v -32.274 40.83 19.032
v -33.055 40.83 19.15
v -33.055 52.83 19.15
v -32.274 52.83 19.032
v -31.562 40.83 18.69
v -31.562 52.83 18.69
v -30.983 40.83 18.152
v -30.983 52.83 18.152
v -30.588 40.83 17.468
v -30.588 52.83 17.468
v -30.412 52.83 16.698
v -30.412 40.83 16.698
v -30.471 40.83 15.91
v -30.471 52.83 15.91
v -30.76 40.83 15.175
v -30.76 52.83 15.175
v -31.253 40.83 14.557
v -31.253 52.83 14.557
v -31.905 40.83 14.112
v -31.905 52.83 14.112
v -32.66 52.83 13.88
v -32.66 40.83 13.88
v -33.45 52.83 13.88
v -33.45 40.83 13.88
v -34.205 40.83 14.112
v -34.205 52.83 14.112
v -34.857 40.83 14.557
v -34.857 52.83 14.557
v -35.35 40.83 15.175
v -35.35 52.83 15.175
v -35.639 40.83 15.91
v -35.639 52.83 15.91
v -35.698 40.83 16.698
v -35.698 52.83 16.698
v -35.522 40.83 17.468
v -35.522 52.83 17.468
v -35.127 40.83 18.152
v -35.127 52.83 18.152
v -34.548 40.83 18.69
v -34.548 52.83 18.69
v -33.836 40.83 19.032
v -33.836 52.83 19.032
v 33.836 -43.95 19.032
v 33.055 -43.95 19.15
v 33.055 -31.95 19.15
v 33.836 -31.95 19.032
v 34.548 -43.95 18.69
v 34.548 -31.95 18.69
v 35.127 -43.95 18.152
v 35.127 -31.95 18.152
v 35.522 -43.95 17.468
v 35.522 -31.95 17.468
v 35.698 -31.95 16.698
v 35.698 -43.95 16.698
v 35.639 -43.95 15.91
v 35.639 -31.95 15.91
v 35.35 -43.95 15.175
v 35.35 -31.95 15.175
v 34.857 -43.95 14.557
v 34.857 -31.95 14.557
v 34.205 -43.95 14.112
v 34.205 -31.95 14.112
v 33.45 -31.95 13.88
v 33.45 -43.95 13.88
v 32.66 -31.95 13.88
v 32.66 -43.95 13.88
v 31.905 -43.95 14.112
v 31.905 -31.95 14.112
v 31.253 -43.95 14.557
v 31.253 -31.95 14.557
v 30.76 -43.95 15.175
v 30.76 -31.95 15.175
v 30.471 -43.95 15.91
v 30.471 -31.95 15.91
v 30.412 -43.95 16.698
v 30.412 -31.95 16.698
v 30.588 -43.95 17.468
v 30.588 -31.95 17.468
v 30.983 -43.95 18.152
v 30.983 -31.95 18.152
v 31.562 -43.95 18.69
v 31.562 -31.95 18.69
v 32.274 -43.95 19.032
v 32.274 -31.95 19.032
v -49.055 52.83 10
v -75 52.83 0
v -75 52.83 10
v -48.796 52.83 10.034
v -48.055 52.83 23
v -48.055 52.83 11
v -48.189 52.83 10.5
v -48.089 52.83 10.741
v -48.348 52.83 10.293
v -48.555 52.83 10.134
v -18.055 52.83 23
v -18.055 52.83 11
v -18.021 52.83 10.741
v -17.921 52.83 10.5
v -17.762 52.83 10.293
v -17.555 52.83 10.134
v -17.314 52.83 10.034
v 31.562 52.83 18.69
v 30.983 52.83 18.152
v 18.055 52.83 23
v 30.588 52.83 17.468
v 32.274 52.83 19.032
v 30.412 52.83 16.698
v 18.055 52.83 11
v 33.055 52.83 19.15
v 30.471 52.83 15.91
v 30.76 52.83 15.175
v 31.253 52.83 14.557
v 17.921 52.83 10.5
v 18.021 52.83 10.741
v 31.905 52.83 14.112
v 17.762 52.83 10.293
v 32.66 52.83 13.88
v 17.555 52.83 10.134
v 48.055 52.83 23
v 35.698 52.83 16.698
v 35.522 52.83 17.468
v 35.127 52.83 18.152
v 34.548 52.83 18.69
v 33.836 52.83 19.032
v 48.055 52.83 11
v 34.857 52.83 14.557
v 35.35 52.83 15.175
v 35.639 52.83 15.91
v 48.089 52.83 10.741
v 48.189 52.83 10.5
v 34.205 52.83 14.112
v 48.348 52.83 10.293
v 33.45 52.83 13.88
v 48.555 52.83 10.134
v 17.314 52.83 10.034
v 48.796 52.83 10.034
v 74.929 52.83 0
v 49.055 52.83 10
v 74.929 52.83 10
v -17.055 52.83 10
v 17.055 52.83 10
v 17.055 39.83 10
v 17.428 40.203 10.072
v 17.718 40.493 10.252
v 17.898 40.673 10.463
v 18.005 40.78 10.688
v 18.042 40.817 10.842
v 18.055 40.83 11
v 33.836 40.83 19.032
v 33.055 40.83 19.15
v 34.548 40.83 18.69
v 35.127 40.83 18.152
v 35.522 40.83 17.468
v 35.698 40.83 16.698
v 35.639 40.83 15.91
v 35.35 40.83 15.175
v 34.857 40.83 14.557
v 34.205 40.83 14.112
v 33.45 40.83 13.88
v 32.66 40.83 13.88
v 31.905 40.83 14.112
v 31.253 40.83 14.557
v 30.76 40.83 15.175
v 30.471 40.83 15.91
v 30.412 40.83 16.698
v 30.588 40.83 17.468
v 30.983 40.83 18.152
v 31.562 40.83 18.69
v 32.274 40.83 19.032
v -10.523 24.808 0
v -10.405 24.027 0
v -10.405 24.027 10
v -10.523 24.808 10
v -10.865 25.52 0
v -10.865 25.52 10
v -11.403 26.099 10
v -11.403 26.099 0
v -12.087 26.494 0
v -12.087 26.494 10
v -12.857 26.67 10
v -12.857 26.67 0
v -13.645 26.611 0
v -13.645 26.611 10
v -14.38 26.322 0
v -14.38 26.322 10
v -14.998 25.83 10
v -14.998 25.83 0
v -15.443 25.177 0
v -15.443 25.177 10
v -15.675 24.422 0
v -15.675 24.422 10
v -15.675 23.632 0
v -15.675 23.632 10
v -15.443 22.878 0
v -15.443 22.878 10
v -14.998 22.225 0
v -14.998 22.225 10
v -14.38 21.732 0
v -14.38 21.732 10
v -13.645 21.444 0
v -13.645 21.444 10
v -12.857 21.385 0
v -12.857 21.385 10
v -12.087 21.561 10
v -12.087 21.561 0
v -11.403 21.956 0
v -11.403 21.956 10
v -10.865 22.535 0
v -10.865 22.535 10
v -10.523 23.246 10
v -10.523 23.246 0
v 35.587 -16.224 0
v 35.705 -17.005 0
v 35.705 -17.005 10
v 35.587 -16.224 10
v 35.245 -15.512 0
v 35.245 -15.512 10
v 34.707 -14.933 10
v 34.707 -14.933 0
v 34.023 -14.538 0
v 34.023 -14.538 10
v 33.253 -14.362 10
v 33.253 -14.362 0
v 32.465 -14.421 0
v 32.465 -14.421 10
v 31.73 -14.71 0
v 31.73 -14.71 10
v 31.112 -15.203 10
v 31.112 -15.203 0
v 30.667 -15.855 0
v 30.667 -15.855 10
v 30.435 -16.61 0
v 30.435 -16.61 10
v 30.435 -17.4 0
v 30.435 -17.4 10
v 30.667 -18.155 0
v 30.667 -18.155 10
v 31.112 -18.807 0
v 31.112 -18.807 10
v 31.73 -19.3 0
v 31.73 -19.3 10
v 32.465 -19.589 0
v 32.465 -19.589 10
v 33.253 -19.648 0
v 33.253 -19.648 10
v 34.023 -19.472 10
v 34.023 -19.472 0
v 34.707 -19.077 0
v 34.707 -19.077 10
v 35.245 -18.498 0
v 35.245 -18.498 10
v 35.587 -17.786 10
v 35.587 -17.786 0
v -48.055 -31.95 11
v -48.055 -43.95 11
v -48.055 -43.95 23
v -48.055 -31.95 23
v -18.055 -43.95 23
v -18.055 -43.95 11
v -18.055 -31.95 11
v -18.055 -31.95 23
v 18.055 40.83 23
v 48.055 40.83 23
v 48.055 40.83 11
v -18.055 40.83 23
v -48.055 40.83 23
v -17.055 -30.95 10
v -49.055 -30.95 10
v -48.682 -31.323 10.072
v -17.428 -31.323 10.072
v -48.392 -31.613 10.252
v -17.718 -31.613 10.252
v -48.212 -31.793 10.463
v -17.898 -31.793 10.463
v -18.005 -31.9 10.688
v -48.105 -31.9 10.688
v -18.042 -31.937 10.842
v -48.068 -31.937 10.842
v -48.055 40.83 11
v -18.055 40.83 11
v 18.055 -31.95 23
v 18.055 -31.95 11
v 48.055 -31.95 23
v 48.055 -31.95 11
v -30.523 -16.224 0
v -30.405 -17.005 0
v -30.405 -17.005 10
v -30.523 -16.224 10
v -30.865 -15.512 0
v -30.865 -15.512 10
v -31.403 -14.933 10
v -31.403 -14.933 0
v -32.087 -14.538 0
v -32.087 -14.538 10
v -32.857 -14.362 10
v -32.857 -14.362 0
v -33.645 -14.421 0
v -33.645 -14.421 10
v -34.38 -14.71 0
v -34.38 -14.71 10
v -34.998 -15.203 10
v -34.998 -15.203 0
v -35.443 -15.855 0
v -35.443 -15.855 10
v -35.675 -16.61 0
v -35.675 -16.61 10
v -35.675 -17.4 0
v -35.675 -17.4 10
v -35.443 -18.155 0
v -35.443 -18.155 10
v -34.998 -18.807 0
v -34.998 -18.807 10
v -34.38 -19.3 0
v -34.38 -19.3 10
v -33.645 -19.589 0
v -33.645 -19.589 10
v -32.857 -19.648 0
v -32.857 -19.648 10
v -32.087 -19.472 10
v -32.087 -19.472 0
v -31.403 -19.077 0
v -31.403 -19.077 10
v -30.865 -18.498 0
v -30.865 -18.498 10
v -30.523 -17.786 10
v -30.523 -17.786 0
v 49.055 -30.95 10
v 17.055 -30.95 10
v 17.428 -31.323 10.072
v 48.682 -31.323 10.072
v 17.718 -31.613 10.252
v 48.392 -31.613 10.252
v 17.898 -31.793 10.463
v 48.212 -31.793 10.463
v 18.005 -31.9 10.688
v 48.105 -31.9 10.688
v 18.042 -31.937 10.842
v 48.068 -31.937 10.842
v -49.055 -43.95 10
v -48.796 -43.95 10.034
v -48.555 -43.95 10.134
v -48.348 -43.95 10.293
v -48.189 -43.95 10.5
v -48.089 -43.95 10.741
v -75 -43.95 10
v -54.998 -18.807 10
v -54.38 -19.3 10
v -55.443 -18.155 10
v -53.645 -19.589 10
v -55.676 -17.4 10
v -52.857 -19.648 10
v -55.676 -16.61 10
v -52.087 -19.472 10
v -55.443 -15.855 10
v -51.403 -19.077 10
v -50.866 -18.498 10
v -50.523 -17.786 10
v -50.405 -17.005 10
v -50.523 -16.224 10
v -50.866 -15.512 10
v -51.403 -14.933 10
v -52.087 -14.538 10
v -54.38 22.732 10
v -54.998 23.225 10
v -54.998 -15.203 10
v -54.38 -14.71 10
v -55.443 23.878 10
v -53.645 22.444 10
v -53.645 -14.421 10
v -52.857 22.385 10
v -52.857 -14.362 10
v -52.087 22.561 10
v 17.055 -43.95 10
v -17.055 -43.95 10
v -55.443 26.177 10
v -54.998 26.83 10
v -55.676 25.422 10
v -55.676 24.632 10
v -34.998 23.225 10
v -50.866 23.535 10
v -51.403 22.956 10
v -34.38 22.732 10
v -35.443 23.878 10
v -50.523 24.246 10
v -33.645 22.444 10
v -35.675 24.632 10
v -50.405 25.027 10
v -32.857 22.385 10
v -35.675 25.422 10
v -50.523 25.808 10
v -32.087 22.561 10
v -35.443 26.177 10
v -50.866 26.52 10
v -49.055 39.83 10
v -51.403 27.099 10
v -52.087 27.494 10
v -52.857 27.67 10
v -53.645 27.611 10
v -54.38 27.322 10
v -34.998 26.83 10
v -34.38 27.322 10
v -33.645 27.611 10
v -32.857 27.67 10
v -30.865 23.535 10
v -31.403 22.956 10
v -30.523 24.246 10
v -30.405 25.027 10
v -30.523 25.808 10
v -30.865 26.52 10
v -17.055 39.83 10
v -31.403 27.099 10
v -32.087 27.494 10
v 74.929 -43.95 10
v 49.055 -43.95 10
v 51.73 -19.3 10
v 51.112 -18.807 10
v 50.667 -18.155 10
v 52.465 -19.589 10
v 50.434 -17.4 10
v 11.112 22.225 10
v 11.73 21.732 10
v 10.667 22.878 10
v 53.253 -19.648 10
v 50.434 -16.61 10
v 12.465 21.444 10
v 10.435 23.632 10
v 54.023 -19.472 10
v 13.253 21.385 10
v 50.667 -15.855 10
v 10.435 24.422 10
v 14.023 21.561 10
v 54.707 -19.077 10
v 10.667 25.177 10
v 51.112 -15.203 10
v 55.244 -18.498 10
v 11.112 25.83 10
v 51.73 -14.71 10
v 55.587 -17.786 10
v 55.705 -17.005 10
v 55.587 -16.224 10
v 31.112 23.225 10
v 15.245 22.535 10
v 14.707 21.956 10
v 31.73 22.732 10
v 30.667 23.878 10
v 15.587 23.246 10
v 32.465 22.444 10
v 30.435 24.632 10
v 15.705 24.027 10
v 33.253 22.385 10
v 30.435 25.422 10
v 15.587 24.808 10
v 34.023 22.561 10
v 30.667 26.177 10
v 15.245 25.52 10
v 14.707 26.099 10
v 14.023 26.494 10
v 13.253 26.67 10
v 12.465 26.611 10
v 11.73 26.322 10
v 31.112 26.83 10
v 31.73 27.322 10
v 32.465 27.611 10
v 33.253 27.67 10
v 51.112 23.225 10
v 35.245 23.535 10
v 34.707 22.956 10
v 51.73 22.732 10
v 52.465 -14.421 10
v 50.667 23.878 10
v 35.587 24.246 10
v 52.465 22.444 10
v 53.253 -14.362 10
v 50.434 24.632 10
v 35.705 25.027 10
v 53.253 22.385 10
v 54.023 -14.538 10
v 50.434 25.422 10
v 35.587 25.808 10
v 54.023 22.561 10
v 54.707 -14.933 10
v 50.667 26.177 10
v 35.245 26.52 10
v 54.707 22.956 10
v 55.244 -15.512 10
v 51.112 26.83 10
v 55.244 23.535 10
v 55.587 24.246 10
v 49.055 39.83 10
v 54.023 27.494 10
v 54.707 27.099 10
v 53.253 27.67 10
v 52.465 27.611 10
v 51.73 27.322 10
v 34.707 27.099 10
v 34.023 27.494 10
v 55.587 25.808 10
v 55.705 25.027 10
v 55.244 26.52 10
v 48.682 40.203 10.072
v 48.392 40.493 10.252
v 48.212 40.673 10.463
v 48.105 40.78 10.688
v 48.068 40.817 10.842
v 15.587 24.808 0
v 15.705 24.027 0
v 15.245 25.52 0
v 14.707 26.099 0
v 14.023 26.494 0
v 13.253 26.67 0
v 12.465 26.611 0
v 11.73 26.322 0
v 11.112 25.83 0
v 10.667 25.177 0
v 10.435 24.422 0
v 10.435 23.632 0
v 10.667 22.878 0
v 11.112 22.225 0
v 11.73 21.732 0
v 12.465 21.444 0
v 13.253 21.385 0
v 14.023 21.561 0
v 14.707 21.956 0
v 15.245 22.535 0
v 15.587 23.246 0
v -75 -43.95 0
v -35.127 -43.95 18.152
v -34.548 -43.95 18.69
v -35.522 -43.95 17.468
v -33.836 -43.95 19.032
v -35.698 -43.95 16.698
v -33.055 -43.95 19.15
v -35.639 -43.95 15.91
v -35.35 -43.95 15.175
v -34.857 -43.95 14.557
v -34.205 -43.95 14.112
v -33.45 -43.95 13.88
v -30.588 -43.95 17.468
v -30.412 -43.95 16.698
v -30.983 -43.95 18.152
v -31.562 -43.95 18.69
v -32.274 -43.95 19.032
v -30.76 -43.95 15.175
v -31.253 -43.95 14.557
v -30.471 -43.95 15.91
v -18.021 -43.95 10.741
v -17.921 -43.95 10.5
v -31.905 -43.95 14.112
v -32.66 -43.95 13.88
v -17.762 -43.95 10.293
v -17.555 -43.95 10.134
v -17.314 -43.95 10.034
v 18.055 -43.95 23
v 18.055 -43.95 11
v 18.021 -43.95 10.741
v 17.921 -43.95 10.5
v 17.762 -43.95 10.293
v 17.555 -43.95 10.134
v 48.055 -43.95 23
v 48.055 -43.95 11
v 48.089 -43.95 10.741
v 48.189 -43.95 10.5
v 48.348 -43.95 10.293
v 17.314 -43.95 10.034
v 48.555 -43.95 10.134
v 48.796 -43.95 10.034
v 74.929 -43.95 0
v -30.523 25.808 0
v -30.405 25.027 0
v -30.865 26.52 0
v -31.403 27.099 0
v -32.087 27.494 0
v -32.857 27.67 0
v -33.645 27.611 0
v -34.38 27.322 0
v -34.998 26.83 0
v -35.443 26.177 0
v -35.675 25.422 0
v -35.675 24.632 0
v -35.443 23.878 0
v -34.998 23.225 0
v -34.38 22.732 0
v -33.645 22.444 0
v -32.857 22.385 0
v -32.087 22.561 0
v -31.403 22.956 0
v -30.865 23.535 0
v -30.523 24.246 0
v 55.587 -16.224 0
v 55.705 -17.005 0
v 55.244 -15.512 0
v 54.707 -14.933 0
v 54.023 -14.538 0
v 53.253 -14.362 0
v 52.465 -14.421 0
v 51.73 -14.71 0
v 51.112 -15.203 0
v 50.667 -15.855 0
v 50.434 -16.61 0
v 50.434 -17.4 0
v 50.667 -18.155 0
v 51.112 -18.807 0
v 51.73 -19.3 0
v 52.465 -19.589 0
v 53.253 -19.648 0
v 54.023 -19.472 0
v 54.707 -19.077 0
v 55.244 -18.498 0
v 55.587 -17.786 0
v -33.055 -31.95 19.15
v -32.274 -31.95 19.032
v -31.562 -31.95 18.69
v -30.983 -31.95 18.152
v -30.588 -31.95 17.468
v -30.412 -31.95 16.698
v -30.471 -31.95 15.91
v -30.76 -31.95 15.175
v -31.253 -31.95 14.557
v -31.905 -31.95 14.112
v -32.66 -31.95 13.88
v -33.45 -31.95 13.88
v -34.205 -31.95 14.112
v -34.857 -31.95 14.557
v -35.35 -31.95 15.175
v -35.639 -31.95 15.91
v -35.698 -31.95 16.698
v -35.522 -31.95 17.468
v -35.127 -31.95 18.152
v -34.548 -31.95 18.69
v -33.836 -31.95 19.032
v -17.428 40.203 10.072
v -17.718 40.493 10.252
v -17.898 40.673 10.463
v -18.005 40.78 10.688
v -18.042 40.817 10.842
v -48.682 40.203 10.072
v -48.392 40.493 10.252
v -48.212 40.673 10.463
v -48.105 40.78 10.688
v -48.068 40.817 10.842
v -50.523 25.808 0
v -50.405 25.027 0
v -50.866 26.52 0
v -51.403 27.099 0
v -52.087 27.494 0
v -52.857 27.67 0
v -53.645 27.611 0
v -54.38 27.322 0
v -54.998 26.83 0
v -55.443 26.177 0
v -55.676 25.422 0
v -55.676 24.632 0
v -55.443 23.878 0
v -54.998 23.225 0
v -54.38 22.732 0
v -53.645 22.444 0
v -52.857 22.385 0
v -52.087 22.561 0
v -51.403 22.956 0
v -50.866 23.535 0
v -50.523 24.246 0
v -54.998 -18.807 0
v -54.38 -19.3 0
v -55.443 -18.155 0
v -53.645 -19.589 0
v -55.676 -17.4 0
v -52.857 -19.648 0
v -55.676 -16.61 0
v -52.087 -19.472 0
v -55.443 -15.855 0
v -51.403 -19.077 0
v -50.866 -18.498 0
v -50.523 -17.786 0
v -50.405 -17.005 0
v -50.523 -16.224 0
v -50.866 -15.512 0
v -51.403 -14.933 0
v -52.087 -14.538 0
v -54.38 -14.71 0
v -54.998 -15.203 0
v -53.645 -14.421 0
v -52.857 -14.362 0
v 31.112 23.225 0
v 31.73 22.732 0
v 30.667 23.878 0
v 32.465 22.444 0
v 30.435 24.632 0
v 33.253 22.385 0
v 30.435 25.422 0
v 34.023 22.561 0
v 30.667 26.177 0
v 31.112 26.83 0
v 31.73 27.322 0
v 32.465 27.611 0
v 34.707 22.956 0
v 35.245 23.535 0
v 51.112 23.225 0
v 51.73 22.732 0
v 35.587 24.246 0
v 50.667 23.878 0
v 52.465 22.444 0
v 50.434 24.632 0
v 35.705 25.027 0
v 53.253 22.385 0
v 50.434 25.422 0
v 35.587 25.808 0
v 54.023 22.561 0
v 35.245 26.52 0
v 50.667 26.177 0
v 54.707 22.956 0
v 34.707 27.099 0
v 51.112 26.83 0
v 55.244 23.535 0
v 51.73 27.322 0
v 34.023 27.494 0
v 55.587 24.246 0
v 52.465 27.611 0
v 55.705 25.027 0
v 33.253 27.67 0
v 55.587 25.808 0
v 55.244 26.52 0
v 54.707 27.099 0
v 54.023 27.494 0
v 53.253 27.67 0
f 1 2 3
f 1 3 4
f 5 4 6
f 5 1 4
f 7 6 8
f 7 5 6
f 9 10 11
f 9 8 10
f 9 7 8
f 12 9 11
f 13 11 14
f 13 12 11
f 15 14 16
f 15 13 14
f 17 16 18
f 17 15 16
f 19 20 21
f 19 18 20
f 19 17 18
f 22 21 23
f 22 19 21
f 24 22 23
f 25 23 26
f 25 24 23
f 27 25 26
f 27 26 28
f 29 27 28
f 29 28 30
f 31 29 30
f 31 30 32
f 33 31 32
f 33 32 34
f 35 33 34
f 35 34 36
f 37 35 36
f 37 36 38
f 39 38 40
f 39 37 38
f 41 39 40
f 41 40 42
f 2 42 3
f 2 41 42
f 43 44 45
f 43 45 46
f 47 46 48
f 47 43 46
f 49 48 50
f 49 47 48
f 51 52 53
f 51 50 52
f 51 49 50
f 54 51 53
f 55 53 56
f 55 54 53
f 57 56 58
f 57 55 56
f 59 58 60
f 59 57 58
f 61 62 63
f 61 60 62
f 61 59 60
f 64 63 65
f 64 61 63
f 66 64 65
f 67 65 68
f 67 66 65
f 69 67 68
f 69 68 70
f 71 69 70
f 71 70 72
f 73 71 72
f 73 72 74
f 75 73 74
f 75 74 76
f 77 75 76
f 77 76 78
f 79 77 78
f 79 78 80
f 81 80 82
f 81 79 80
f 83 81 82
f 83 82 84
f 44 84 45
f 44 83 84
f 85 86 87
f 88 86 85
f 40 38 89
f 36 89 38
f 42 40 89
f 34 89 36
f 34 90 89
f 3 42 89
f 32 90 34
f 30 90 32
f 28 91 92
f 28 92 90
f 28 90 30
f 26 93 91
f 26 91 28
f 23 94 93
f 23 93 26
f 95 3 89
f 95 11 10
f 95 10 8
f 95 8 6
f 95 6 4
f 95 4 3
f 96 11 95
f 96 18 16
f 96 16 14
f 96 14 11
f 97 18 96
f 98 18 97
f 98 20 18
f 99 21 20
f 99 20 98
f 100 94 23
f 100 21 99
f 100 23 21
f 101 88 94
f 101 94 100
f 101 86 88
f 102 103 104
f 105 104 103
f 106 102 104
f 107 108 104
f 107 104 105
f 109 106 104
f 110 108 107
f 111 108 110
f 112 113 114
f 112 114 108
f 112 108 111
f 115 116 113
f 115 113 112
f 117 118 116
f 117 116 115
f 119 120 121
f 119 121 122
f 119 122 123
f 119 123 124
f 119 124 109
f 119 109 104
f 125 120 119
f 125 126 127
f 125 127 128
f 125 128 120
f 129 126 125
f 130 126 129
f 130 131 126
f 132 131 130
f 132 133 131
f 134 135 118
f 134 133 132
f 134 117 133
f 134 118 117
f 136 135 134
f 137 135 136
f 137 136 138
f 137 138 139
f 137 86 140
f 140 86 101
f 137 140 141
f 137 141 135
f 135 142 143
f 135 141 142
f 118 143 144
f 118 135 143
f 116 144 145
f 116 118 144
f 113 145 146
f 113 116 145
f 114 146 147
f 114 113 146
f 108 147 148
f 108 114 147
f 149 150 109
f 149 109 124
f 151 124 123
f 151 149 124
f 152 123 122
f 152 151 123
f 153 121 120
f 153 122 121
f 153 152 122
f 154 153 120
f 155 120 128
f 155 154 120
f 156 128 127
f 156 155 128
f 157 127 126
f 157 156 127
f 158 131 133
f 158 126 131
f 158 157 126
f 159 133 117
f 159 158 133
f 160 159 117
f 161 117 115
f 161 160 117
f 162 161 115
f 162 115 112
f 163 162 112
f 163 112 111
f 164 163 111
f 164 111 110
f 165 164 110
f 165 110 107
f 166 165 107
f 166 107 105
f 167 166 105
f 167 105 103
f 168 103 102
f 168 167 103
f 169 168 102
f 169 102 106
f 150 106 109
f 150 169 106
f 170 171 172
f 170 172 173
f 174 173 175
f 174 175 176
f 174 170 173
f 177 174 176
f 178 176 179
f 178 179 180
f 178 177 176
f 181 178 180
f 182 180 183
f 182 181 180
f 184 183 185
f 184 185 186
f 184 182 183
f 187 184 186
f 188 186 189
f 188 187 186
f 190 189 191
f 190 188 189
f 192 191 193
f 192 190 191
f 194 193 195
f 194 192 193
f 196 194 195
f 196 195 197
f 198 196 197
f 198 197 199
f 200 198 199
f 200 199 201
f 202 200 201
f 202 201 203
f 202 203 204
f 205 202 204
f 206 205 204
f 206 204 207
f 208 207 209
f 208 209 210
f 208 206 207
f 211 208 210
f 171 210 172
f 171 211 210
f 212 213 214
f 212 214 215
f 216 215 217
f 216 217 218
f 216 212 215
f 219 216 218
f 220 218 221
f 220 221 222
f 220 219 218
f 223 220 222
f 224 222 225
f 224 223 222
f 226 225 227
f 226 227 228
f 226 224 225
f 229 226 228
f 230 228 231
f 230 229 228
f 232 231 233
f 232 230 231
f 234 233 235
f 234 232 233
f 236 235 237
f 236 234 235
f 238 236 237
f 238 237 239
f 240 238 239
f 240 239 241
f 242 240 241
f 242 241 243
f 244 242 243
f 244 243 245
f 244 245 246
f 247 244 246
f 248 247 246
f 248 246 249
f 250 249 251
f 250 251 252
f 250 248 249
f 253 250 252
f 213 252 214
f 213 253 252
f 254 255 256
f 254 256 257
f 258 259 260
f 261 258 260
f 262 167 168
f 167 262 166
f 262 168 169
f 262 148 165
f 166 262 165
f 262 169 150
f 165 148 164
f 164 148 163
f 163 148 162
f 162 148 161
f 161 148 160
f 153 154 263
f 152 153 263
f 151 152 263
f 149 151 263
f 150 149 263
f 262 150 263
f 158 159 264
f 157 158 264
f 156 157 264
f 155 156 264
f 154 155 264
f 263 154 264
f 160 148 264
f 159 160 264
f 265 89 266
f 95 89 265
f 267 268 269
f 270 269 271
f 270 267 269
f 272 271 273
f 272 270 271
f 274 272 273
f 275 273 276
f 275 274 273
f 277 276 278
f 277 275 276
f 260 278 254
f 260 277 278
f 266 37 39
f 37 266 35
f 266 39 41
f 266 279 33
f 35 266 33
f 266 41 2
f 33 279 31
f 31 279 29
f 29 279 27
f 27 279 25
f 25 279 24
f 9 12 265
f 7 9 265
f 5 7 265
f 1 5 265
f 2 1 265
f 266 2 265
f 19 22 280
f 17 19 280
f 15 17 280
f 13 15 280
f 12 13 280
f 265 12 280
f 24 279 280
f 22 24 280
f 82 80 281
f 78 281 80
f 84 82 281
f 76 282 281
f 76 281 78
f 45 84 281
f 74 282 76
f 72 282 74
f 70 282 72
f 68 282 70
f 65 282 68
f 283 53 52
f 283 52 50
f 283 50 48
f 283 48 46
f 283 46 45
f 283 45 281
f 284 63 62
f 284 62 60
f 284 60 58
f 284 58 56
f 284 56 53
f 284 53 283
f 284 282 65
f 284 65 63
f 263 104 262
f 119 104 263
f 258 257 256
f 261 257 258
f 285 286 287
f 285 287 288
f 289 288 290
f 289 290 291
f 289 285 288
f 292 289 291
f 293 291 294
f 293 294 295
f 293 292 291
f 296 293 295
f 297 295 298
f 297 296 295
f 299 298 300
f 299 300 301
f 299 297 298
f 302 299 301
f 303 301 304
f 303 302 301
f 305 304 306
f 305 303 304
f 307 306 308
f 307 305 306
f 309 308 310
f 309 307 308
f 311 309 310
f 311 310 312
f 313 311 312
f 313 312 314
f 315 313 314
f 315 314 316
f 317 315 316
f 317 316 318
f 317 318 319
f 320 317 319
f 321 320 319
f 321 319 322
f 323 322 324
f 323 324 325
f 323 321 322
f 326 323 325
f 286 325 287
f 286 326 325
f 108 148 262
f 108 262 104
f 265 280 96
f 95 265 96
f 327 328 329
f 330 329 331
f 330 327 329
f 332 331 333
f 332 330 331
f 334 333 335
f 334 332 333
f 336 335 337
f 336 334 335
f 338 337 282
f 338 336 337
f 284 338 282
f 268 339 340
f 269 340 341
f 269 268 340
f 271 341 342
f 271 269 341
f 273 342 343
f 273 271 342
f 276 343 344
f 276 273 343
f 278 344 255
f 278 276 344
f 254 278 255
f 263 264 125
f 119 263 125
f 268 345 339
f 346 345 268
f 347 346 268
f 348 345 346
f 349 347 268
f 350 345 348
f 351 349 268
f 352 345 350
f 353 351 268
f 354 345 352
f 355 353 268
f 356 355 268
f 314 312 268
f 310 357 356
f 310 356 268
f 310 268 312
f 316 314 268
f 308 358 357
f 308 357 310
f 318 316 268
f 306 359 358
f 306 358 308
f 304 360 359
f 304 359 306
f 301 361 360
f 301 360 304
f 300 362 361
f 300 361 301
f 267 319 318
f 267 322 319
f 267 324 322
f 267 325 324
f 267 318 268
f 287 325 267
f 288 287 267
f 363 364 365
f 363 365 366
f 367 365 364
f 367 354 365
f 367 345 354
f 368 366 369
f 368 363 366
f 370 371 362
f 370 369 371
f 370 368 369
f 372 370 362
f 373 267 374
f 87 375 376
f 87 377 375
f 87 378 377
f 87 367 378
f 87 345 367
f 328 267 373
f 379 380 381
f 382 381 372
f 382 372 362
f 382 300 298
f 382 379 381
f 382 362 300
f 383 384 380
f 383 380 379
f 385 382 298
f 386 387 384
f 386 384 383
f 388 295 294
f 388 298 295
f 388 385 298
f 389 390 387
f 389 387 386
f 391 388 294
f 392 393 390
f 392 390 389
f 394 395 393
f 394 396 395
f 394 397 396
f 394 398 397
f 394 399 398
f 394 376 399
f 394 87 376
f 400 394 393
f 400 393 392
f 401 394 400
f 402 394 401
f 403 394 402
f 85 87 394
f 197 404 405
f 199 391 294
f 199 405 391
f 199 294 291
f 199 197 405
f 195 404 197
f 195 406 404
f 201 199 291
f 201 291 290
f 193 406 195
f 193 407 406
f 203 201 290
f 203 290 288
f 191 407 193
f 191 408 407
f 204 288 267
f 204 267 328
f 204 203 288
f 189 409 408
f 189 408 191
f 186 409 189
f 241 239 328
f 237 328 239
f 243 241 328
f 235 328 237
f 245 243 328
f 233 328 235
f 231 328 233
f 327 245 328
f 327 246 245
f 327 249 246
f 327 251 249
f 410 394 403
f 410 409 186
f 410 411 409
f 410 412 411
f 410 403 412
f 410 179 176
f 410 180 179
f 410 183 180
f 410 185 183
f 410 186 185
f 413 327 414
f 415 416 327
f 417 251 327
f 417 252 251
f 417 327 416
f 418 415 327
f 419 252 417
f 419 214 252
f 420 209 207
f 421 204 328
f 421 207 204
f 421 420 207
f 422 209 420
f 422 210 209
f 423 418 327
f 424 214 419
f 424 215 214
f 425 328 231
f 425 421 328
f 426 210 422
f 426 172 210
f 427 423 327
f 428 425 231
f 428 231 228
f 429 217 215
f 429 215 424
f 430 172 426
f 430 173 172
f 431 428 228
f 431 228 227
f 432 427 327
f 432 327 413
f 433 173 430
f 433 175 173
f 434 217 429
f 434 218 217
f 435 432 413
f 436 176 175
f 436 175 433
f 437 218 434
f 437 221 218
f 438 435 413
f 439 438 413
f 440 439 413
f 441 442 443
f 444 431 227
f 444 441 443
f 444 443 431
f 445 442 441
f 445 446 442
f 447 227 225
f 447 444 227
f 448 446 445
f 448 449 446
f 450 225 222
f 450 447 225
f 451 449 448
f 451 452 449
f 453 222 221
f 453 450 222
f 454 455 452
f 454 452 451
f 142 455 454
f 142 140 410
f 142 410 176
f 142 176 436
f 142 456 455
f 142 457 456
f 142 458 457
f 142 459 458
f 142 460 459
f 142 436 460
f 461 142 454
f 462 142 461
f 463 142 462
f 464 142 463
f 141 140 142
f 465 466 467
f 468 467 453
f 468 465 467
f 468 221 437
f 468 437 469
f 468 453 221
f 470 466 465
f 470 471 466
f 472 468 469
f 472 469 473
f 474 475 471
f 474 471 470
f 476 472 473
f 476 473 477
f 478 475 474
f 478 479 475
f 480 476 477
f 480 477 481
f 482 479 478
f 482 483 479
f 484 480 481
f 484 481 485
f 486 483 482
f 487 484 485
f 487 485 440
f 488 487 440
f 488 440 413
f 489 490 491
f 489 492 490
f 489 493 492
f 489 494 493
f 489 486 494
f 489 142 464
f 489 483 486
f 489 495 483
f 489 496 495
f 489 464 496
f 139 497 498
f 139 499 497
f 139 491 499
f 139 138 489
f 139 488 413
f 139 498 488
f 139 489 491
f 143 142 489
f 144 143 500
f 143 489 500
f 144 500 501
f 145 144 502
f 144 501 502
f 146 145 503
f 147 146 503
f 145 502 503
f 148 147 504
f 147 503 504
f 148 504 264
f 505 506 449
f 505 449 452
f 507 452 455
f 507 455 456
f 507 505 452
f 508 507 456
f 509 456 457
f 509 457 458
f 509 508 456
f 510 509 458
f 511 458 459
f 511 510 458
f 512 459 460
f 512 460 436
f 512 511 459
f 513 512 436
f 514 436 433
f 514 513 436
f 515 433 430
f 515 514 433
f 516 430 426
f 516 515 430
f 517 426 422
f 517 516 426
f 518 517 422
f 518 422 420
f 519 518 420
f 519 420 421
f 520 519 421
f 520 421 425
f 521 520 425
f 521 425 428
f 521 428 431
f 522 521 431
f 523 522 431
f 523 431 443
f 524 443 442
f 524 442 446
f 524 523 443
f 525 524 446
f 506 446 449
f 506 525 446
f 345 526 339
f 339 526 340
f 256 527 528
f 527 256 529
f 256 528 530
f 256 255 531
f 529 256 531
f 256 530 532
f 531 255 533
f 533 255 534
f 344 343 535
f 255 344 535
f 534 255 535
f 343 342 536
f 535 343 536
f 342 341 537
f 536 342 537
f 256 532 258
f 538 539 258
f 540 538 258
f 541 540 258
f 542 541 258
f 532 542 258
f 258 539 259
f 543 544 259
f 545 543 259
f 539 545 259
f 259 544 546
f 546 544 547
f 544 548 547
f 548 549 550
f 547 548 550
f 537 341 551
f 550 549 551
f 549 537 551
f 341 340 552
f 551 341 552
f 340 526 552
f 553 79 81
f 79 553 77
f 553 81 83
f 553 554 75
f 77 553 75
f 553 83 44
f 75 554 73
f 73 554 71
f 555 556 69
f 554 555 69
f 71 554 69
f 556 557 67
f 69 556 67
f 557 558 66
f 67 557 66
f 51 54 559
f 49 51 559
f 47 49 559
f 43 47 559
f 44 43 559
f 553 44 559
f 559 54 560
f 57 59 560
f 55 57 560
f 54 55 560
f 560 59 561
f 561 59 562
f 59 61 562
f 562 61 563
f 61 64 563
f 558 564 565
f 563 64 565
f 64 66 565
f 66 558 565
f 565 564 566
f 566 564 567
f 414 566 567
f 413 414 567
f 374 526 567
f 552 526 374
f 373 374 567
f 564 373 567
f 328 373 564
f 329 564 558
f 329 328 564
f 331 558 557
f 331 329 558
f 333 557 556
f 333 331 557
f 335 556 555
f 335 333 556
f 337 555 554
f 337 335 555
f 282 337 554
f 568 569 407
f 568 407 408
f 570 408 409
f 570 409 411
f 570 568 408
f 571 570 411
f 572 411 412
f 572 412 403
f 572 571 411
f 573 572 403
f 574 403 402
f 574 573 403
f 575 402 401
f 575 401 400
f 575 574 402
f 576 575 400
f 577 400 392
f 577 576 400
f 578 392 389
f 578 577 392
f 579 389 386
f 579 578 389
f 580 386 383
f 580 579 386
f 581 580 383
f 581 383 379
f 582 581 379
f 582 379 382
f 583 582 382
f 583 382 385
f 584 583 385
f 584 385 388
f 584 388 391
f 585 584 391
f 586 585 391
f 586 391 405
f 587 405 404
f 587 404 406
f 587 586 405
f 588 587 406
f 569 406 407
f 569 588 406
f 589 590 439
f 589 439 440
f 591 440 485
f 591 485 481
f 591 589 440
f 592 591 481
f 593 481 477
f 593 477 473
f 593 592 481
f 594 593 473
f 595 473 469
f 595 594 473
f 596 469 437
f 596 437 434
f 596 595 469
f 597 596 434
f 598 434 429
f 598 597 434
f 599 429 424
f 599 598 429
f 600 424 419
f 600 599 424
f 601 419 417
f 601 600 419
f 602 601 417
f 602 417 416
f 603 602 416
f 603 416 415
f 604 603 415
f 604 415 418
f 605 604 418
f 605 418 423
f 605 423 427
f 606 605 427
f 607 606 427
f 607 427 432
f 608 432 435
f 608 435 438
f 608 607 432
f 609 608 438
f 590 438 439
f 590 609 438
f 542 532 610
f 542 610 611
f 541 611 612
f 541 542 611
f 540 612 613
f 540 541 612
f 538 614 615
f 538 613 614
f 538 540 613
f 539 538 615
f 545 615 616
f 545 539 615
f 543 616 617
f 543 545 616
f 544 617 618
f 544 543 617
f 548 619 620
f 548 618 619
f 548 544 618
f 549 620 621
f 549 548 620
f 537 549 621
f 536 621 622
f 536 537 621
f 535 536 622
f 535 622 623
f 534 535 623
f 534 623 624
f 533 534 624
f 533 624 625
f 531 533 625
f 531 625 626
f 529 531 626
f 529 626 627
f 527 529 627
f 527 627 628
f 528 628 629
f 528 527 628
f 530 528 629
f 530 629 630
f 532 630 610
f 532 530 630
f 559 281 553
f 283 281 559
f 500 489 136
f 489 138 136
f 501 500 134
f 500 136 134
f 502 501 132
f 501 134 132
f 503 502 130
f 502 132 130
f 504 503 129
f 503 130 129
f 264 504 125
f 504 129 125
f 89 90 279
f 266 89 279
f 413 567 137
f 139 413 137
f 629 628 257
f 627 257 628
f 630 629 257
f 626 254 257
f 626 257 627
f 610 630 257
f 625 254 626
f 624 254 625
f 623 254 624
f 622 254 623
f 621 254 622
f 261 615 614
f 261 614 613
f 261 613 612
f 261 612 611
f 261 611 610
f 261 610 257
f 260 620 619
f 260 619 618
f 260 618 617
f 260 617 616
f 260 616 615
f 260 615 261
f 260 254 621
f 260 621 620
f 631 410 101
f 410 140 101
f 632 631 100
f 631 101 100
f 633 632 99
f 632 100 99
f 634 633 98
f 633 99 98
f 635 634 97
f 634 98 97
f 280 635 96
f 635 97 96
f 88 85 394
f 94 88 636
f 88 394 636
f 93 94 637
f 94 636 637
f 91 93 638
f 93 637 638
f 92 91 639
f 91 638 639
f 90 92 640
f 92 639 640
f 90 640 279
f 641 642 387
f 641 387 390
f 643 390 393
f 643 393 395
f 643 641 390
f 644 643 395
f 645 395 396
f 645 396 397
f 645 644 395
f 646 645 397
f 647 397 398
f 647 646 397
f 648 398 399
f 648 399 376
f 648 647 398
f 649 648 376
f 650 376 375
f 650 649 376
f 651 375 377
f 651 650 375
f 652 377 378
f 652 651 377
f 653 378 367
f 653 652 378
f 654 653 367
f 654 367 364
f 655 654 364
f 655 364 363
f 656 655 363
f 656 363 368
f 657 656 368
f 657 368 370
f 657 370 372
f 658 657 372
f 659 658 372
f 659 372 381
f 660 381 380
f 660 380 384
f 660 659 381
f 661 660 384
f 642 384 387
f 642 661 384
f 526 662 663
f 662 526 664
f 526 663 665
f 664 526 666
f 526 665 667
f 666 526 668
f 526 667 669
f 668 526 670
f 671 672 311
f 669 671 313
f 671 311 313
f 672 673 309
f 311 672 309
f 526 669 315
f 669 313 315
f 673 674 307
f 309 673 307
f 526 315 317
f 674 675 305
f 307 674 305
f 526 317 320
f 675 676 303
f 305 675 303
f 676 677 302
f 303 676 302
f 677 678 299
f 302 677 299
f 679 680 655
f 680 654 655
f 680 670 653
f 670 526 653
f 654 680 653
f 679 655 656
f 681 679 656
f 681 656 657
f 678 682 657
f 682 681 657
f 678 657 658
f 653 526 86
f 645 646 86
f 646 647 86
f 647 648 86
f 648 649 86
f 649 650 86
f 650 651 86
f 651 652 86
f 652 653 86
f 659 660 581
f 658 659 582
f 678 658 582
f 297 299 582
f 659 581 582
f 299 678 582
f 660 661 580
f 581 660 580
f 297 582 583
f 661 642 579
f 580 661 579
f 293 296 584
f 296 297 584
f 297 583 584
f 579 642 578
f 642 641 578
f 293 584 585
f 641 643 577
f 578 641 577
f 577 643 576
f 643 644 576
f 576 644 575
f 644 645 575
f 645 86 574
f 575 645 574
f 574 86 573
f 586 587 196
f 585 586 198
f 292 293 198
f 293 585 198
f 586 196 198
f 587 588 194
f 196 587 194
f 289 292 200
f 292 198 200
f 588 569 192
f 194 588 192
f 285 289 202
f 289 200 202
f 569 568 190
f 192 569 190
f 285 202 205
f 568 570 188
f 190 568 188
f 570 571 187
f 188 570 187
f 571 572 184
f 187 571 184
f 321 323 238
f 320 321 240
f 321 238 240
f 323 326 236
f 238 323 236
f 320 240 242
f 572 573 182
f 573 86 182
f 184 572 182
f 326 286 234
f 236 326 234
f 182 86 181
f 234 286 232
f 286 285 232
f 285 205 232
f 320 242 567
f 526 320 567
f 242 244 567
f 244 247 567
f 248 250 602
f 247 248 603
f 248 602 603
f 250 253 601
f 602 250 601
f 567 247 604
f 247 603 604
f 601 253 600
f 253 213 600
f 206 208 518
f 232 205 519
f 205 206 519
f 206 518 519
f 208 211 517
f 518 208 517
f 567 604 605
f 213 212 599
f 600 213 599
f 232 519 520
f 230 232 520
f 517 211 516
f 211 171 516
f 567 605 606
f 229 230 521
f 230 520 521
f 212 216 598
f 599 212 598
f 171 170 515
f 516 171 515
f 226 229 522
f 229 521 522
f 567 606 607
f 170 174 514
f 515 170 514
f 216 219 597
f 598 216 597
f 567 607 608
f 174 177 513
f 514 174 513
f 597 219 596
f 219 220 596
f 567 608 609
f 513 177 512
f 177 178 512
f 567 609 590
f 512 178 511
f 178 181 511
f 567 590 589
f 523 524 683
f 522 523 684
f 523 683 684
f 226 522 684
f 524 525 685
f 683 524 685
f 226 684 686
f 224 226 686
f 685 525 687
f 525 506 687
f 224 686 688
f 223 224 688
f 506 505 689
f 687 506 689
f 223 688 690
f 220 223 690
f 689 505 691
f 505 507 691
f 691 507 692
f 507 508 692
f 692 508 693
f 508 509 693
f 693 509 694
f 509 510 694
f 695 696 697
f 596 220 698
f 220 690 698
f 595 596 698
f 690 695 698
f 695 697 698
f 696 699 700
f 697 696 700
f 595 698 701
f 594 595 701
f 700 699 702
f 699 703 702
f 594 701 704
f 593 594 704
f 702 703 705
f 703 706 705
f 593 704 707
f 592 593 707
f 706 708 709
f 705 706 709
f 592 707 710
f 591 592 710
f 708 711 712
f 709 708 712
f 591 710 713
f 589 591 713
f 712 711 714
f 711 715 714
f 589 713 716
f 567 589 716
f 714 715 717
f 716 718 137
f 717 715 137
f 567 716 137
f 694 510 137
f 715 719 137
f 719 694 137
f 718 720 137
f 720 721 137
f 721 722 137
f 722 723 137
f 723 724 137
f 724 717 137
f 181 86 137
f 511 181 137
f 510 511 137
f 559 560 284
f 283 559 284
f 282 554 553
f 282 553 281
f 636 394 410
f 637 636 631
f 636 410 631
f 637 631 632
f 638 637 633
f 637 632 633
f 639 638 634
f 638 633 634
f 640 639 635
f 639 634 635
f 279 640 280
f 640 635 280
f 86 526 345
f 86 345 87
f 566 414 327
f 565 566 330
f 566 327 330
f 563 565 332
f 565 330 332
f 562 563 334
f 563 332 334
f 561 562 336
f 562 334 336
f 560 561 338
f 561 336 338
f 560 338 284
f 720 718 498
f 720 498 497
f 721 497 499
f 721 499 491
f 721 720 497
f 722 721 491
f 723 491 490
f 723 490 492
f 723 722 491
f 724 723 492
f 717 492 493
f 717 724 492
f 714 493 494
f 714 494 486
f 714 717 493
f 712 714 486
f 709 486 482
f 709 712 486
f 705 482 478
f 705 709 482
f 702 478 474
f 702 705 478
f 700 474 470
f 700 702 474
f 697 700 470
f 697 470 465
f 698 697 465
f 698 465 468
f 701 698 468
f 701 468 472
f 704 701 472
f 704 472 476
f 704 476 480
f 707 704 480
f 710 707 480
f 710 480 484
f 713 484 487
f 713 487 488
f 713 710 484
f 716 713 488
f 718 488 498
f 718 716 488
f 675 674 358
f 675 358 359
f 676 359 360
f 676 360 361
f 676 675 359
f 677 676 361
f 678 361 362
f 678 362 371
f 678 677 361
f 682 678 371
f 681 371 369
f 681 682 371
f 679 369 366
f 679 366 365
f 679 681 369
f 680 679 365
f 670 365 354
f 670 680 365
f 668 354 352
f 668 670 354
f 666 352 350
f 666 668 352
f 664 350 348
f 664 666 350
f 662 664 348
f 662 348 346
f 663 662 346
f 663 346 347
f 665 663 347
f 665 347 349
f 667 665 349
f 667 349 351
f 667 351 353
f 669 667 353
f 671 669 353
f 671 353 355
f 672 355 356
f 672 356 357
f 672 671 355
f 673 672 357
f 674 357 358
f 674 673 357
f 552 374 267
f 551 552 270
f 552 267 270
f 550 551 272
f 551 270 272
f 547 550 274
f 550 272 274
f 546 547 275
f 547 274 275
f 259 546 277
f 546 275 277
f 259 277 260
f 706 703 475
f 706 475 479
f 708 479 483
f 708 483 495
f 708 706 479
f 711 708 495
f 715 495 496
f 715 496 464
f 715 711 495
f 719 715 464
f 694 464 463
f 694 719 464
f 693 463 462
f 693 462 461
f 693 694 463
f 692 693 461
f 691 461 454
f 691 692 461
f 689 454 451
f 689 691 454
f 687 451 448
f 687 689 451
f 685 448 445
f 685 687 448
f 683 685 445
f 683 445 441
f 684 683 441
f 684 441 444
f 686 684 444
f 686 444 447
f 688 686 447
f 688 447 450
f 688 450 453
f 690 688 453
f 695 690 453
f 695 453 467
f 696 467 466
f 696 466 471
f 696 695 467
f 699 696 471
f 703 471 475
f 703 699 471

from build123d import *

# Parameters (mm, degrees)
SKETCH3_W               = 149.929020718
SKETCH3_H               = 96.78
SKETCH3_R               = 2.65
BOSS_EXTRUDE1_DEPTH     = 10
SKETCH4_W               = 30
SKETCH4_H               = 12
BOSS_EXTRUDE4_DEPTH     = 13
CUT_EXTRUDE1_DEPTH      = 116.506286536
CUT_EXTRUDE1_DEPTH_BACK = 116.506286536
SKETCH8_R               = 2.65
FILLET1_R               = 1


with BuildPart() as part:
    # Sketch3 → Boss-Extrude1 (new body)
    with BuildSketch(Plane.XY):
        with Locations((-0.035848502, 4.44)):
            Rectangle(SKETCH3_W, SKETCH3_H)
        with Locations((-53.055358861, -17.005)):
            Circle(SKETCH3_R, mode=Mode.SUBTRACT)
        with Locations((-33.055, -17.005)):
            Circle(SKETCH3_R, mode=Mode.SUBTRACT)
        with Locations((33.055, -17.005)):
            Circle(SKETCH3_R, mode=Mode.SUBTRACT)
        with Locations((53.054641139, -17.005)):
            Circle(SKETCH3_R, mode=Mode.SUBTRACT)
        with Locations((-53.055358861, 25.027361408)):
            Circle(SKETCH3_R, mode=Mode.SUBTRACT)
        with Locations((-33.055, 25.027361408)):
            Circle(SKETCH3_R, mode=Mode.SUBTRACT)
        with Locations((-13.055, 24.027361408)):
            Circle(SKETCH3_R, mode=Mode.SUBTRACT)
        with Locations((13.055, 24.027361408)):
            Circle(SKETCH3_R, mode=Mode.SUBTRACT)
        with Locations((33.055, 25.027361408)):
            Circle(SKETCH3_R, mode=Mode.SUBTRACT)
        with Locations((53.054641139, 25.027361408)):
            Circle(SKETCH3_R, mode=Mode.SUBTRACT)
    extrude(amount=BOSS_EXTRUDE1_DEPTH)

    # Sketch4 → Boss-Extrude4 (add)
    with BuildSketch(Plane.XY.offset(10)):
        Polygon((-48.055, 40.83), (-33.055, 40.83), (-18.055, 40.83), (-18.055, 52.83), (-48.055, 52.83), align=None)
        with Locations((33.055, 46.83)):
            Rectangle(SKETCH4_W, SKETCH4_H)
        with Locations((-33.055, -37.95)):
            Rectangle(SKETCH4_W, SKETCH4_H)
        with Locations((33.055, -37.95)):
            Rectangle(SKETCH4_W, SKETCH4_H)
    extrude(amount=BOSS_EXTRUDE4_DEPTH)

    # Sketch8 → Cut-Extrude1 (cut, two sides: drawn at the far end of the back side and taken through both)
    with BuildSketch(Plane(origin=(0, -31.95, 0), x_dir=(1, 0, 0), z_dir=(0, 1, 0)).offset(-CUT_EXTRUDE1_DEPTH_BACK)):
        with Locations(Location((-33.055, -16.5, 0), (0, 0, 270))):
            Circle(SKETCH8_R)
        with Locations(Location((33.055, -16.5, 0), (0, 0, 270))):
            Circle(SKETCH8_R)
    extrude(amount=CUT_EXTRUDE1_DEPTH + CUT_EXTRUDE1_DEPTH_BACK, mode=Mode.SUBTRACT)

    # Fillet1
    fillet1_edges = [part.edges().sort_by_distance(p)[0] for p in [
        (-33.055, 40.83, 10),
        (-18.055, 46.83, 10),
        (-48.055, 46.83, 10),
        (33.055, 40.83, 10),
        (48.055, 46.83, 10),
        (18.055, 46.83, 10),
        (-18.055, -37.95, 10),
        (-33.055, -31.95, 10),
        (-48.055, -37.95, 10),
        (48.055, -37.95, 10),
        (33.055, -31.95, 10),
        (18.055, -37.95, 10),
    ]]
    fillet(fillet1_edges, radius=FILLET1_R)


solid = part.part
